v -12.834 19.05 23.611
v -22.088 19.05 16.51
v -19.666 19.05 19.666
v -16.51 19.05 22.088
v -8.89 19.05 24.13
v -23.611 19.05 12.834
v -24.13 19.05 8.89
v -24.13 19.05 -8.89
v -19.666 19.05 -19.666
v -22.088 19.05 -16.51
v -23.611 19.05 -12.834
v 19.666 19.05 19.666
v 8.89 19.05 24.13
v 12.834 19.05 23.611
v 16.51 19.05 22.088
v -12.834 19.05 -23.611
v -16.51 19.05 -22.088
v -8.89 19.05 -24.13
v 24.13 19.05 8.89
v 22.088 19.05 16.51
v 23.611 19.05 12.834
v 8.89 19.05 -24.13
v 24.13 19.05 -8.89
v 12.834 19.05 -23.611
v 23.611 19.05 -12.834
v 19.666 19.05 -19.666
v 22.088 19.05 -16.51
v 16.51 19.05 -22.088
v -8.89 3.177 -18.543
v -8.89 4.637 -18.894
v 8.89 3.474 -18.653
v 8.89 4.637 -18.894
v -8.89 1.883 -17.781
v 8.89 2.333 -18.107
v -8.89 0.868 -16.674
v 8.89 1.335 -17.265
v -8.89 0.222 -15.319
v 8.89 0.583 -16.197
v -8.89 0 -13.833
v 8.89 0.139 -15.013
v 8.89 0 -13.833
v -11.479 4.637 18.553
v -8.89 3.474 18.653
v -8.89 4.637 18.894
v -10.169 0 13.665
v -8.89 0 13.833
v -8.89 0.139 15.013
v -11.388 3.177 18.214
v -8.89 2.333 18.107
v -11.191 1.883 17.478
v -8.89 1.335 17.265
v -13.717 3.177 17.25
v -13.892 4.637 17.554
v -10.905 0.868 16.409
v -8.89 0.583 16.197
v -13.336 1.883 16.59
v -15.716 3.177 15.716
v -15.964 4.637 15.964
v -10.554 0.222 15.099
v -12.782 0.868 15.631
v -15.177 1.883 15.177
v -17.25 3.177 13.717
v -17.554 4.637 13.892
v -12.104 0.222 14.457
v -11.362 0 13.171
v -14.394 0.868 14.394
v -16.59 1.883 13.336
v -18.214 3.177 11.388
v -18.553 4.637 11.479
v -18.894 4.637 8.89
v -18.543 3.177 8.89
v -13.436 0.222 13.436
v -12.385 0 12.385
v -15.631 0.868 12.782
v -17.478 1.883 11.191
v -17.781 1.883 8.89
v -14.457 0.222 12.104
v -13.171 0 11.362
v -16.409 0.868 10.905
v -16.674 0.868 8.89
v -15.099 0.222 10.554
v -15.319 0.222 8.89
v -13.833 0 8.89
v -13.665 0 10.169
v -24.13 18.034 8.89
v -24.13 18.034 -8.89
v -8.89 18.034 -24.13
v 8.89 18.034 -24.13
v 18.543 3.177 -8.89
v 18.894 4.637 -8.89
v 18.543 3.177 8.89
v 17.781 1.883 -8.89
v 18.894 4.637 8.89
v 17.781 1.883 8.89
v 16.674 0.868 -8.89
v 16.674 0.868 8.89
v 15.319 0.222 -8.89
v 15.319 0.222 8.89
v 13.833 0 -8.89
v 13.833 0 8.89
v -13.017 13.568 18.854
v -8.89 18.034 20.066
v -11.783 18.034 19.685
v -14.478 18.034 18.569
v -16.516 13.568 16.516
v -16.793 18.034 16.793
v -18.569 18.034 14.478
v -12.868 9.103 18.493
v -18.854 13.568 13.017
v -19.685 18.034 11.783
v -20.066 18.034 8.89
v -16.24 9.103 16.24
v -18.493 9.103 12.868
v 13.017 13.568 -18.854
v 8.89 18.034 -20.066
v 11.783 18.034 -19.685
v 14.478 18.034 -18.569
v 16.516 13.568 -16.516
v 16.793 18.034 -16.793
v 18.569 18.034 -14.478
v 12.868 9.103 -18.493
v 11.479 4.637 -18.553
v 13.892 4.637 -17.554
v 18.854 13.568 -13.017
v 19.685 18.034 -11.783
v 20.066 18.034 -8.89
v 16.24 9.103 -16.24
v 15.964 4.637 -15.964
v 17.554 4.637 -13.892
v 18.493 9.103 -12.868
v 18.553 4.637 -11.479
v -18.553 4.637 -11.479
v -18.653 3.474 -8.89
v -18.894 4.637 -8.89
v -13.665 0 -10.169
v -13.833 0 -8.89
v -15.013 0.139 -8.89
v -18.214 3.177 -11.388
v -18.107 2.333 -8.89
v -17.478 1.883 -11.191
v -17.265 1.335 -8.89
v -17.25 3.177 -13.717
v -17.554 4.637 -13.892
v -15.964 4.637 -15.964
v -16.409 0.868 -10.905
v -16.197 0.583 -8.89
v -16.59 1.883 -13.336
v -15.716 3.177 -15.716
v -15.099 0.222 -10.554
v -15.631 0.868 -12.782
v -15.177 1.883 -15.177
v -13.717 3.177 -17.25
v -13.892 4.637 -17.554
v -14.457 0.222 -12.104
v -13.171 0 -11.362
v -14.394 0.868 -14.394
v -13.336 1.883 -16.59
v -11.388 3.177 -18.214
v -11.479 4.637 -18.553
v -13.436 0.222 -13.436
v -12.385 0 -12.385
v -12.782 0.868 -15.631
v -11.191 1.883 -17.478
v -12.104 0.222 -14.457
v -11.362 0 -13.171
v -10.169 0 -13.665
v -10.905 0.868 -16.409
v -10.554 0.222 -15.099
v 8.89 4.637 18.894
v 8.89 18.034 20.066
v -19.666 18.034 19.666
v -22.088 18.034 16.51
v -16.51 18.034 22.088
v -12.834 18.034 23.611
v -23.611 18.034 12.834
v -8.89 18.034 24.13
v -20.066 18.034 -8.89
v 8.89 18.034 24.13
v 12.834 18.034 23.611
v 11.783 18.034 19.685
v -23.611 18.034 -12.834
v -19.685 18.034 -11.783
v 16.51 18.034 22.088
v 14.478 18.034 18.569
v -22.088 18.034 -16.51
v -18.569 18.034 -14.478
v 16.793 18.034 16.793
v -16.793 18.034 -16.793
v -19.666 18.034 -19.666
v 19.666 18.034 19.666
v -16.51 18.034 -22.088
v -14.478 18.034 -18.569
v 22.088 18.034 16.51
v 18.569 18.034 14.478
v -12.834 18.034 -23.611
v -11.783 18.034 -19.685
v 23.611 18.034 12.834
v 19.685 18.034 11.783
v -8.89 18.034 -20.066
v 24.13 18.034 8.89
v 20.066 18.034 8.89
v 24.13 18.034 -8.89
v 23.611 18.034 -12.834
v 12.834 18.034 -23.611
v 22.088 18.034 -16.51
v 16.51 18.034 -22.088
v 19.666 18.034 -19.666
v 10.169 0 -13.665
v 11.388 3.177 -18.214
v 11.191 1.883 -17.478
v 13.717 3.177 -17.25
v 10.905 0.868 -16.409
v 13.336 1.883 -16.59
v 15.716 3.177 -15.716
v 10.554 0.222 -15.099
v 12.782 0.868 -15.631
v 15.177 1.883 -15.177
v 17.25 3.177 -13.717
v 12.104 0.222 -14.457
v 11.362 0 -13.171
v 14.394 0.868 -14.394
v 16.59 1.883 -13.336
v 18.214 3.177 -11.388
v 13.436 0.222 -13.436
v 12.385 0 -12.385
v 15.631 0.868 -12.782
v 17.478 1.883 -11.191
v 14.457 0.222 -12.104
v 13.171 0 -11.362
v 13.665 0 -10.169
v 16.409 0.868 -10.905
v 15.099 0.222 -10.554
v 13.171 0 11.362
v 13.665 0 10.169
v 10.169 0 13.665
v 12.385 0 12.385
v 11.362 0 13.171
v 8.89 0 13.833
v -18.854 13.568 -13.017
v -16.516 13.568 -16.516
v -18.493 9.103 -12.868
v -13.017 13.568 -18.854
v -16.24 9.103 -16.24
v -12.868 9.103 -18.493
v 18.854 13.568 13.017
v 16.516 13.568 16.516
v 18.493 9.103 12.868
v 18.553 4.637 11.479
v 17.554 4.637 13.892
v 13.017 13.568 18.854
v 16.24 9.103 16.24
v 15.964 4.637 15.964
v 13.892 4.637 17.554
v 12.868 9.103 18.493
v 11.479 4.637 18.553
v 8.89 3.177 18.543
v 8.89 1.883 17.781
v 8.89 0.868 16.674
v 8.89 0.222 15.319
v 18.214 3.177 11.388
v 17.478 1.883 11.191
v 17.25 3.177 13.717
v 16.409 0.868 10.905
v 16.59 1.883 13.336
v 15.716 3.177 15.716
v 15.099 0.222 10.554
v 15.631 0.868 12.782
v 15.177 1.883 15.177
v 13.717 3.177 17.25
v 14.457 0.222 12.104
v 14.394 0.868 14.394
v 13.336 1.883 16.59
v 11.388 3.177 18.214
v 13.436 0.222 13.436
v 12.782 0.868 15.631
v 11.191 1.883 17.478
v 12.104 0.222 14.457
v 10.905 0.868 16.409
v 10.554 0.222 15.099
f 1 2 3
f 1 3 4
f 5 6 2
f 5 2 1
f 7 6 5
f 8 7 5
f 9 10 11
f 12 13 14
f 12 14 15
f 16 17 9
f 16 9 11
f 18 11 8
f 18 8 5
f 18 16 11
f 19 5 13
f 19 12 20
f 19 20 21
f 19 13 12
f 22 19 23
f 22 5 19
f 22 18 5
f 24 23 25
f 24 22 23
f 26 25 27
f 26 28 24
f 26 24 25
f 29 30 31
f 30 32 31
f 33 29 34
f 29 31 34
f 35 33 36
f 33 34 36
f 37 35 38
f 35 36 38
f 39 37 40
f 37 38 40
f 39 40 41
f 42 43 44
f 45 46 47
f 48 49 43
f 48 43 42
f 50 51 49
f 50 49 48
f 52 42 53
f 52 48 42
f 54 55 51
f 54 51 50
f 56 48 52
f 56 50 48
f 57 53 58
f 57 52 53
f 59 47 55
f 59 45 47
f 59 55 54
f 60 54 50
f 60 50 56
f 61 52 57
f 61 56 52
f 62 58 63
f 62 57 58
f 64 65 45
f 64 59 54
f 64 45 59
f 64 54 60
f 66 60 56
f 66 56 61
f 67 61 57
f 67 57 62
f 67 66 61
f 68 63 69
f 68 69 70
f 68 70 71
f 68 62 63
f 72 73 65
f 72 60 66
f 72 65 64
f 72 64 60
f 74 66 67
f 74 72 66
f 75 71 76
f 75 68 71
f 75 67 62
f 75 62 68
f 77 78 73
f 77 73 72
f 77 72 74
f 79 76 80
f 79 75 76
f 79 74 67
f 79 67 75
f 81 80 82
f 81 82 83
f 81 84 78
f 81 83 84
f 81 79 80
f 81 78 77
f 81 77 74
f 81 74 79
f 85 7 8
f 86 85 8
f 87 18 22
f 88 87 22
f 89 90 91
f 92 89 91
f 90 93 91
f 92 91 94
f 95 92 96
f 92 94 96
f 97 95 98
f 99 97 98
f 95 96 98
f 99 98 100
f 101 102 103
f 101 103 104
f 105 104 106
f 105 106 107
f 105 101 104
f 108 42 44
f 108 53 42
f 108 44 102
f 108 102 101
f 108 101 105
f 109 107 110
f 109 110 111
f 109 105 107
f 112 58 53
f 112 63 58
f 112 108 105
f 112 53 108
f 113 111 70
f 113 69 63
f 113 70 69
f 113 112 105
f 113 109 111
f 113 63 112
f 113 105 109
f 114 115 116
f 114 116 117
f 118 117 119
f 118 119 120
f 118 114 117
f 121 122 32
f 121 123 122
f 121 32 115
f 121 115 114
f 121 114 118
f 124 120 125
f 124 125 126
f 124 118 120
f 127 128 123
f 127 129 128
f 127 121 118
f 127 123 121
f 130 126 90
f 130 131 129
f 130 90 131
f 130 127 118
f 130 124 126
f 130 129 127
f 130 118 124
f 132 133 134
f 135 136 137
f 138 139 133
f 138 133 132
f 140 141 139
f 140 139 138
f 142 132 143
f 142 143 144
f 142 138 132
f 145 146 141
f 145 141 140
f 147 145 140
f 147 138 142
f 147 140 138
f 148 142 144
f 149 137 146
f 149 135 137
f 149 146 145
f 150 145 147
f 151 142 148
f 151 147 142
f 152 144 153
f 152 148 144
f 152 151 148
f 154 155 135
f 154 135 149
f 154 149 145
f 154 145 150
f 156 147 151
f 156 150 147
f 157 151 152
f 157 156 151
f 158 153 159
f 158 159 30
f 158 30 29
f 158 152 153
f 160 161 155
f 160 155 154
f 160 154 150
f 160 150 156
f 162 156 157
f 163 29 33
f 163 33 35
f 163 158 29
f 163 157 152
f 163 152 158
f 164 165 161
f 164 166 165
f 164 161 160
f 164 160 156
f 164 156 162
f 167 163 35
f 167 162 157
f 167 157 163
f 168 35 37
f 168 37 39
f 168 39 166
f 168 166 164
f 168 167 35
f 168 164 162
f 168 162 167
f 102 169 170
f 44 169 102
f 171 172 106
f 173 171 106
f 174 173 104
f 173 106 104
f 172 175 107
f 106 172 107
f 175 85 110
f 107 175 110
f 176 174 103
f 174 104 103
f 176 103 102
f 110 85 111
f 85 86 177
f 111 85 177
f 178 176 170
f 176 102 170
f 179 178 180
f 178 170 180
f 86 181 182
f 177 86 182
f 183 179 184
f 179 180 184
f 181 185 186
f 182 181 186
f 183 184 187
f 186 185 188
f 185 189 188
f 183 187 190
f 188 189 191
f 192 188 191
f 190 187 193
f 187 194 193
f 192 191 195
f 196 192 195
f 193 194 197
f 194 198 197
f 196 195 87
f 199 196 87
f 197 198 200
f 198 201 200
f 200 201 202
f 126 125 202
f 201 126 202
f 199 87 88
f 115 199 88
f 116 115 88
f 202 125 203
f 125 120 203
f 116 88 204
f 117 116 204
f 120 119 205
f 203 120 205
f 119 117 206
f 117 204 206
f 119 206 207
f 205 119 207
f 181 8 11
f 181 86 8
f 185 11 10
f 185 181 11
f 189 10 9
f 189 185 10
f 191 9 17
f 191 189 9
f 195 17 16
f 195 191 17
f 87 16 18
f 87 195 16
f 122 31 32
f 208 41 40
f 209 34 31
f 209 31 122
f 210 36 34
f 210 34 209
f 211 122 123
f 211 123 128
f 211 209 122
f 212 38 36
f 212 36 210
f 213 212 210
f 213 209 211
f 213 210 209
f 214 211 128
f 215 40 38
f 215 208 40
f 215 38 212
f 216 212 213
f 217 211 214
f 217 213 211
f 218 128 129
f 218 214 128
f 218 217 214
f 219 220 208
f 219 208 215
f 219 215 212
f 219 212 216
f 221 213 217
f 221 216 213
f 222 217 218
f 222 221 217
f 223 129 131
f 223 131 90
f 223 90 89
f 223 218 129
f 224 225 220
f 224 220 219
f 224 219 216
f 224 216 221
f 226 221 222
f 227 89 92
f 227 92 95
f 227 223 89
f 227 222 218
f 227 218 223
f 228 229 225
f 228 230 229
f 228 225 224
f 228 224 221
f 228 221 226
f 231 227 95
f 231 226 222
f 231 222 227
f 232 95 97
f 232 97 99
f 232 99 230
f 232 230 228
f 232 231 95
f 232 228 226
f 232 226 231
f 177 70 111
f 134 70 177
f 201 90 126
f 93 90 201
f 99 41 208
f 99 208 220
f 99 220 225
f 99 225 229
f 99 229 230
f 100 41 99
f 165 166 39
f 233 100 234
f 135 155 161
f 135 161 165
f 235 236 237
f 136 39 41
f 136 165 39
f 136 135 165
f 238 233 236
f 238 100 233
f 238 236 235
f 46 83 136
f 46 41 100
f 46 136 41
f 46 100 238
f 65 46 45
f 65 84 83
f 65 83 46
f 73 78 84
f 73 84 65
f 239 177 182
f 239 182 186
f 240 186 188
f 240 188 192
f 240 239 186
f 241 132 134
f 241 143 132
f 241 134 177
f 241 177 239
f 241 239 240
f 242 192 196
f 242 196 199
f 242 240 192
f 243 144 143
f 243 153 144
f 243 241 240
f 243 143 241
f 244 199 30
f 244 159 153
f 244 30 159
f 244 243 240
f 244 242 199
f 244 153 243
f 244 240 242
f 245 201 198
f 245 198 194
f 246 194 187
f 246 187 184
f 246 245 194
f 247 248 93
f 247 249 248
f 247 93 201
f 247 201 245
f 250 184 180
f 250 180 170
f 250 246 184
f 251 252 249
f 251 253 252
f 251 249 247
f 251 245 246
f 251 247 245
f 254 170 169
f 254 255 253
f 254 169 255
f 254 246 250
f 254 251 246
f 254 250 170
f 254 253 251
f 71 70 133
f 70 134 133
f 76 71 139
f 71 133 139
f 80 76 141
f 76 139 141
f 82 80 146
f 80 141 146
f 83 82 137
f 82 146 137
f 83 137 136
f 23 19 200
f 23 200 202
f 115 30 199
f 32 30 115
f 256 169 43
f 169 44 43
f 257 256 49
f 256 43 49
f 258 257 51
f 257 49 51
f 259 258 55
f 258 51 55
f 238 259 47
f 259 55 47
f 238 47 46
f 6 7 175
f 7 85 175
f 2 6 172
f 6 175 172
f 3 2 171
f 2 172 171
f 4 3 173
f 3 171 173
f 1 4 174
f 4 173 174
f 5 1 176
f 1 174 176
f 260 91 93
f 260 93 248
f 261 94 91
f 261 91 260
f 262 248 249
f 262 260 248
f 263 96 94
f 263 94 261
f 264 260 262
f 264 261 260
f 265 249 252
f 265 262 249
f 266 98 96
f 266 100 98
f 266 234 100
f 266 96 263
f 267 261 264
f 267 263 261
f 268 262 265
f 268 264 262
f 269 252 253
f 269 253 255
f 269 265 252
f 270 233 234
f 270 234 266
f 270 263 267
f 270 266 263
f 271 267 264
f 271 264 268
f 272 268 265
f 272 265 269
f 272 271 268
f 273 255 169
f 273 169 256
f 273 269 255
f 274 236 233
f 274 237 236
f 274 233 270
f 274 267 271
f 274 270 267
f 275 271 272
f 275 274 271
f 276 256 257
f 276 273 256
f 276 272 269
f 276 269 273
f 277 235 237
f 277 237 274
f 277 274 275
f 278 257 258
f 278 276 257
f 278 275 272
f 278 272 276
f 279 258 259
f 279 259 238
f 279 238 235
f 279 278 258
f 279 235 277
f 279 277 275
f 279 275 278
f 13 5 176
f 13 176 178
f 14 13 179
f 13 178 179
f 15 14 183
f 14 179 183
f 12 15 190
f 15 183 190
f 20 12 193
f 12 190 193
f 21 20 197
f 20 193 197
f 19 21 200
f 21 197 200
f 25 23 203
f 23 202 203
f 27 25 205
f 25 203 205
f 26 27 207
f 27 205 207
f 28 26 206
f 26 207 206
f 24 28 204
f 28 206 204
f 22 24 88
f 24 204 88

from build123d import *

# Parameters (mm, degrees)
SKETCH1_W           = 48.26
SKETCH1_H           = 48.26
BOSS_EXTRUDE1_DEPTH = 1.016
FILLET1_R           = 15.24
BOSS_EXTRUDE2_DEPTH = 18.034
BOSS_EXTRUDE2_TAPER = 5
FILLET2_R           = 5.08


with BuildPart() as part:
    # Sketch1 → Boss-Extrude1 (new body)
    with BuildSketch(Plane(origin=(0, 19.05, 0), x_dir=(1, 0, 0), z_dir=(0, 1, 0))):
        Rectangle(SKETCH1_W, SKETCH1_H)
    extrude(amount=-BOSS_EXTRUDE1_DEPTH)

    # Fillet1
    fillet1_edges = [part.edges().sort_by_distance(p)[0] for p in [
        (-24.13, 18.542, -24.13),
        (24.13, 18.542, -24.13),
        (24.13, 18.542, 24.13),
        (-24.13, 18.542, 24.13),
    ]]
    fillet(fillet1_edges, radius=FILLET1_R)

    # Sketch2 → Boss-Extrude2 (add)
    with BuildSketch(Plane.XZ.offset(-18.034)):
        with BuildLine():
            Line((8.89, 20.066), (-8.89, 20.066))
            ThreePointArc((-8.89, 20.066), (-16.792625387, 16.792625387), (-20.066, 8.89))
            Line((-20.066, 8.89), (-20.066, -8.89))
            ThreePointArc((-20.066, -8.89), (-16.792625387, -16.792625387), (-8.89, -20.066))
            Line((-8.89, -20.066), (8.89, -20.066))
            ThreePointArc((8.89, -20.066), (16.792625387, -16.792625387), (20.066, -8.89))
            Line((20.066, -8.89), (20.066, 8.89))
            ThreePointArc((20.066, 8.89), (16.792625387, 16.792625387), (8.89, 20.066))
        make_face()
    extrude(amount=BOSS_EXTRUDE2_DEPTH, taper=BOSS_EXTRUDE2_TAPER)

    # Fillet2
    fillet2_edges = [part.edges().sort_by_distance(p)[0] for p in [
        (18.488229442, 0, 0),
        (15.676973126, 0, -15.676973126),
        (0, 0, -18.488229442),
        (-15.676973126, 0, -15.676973126),
        (-18.488229442, 0, 0),
        (-15.676973126, 0, 15.676973126),
        (0, 0, 18.488229442),
        (15.676973126, 0, 15.676973126),
    ]]
    fillet(fillet2_edges, radius=FILLET2_R)


solid = part.part
